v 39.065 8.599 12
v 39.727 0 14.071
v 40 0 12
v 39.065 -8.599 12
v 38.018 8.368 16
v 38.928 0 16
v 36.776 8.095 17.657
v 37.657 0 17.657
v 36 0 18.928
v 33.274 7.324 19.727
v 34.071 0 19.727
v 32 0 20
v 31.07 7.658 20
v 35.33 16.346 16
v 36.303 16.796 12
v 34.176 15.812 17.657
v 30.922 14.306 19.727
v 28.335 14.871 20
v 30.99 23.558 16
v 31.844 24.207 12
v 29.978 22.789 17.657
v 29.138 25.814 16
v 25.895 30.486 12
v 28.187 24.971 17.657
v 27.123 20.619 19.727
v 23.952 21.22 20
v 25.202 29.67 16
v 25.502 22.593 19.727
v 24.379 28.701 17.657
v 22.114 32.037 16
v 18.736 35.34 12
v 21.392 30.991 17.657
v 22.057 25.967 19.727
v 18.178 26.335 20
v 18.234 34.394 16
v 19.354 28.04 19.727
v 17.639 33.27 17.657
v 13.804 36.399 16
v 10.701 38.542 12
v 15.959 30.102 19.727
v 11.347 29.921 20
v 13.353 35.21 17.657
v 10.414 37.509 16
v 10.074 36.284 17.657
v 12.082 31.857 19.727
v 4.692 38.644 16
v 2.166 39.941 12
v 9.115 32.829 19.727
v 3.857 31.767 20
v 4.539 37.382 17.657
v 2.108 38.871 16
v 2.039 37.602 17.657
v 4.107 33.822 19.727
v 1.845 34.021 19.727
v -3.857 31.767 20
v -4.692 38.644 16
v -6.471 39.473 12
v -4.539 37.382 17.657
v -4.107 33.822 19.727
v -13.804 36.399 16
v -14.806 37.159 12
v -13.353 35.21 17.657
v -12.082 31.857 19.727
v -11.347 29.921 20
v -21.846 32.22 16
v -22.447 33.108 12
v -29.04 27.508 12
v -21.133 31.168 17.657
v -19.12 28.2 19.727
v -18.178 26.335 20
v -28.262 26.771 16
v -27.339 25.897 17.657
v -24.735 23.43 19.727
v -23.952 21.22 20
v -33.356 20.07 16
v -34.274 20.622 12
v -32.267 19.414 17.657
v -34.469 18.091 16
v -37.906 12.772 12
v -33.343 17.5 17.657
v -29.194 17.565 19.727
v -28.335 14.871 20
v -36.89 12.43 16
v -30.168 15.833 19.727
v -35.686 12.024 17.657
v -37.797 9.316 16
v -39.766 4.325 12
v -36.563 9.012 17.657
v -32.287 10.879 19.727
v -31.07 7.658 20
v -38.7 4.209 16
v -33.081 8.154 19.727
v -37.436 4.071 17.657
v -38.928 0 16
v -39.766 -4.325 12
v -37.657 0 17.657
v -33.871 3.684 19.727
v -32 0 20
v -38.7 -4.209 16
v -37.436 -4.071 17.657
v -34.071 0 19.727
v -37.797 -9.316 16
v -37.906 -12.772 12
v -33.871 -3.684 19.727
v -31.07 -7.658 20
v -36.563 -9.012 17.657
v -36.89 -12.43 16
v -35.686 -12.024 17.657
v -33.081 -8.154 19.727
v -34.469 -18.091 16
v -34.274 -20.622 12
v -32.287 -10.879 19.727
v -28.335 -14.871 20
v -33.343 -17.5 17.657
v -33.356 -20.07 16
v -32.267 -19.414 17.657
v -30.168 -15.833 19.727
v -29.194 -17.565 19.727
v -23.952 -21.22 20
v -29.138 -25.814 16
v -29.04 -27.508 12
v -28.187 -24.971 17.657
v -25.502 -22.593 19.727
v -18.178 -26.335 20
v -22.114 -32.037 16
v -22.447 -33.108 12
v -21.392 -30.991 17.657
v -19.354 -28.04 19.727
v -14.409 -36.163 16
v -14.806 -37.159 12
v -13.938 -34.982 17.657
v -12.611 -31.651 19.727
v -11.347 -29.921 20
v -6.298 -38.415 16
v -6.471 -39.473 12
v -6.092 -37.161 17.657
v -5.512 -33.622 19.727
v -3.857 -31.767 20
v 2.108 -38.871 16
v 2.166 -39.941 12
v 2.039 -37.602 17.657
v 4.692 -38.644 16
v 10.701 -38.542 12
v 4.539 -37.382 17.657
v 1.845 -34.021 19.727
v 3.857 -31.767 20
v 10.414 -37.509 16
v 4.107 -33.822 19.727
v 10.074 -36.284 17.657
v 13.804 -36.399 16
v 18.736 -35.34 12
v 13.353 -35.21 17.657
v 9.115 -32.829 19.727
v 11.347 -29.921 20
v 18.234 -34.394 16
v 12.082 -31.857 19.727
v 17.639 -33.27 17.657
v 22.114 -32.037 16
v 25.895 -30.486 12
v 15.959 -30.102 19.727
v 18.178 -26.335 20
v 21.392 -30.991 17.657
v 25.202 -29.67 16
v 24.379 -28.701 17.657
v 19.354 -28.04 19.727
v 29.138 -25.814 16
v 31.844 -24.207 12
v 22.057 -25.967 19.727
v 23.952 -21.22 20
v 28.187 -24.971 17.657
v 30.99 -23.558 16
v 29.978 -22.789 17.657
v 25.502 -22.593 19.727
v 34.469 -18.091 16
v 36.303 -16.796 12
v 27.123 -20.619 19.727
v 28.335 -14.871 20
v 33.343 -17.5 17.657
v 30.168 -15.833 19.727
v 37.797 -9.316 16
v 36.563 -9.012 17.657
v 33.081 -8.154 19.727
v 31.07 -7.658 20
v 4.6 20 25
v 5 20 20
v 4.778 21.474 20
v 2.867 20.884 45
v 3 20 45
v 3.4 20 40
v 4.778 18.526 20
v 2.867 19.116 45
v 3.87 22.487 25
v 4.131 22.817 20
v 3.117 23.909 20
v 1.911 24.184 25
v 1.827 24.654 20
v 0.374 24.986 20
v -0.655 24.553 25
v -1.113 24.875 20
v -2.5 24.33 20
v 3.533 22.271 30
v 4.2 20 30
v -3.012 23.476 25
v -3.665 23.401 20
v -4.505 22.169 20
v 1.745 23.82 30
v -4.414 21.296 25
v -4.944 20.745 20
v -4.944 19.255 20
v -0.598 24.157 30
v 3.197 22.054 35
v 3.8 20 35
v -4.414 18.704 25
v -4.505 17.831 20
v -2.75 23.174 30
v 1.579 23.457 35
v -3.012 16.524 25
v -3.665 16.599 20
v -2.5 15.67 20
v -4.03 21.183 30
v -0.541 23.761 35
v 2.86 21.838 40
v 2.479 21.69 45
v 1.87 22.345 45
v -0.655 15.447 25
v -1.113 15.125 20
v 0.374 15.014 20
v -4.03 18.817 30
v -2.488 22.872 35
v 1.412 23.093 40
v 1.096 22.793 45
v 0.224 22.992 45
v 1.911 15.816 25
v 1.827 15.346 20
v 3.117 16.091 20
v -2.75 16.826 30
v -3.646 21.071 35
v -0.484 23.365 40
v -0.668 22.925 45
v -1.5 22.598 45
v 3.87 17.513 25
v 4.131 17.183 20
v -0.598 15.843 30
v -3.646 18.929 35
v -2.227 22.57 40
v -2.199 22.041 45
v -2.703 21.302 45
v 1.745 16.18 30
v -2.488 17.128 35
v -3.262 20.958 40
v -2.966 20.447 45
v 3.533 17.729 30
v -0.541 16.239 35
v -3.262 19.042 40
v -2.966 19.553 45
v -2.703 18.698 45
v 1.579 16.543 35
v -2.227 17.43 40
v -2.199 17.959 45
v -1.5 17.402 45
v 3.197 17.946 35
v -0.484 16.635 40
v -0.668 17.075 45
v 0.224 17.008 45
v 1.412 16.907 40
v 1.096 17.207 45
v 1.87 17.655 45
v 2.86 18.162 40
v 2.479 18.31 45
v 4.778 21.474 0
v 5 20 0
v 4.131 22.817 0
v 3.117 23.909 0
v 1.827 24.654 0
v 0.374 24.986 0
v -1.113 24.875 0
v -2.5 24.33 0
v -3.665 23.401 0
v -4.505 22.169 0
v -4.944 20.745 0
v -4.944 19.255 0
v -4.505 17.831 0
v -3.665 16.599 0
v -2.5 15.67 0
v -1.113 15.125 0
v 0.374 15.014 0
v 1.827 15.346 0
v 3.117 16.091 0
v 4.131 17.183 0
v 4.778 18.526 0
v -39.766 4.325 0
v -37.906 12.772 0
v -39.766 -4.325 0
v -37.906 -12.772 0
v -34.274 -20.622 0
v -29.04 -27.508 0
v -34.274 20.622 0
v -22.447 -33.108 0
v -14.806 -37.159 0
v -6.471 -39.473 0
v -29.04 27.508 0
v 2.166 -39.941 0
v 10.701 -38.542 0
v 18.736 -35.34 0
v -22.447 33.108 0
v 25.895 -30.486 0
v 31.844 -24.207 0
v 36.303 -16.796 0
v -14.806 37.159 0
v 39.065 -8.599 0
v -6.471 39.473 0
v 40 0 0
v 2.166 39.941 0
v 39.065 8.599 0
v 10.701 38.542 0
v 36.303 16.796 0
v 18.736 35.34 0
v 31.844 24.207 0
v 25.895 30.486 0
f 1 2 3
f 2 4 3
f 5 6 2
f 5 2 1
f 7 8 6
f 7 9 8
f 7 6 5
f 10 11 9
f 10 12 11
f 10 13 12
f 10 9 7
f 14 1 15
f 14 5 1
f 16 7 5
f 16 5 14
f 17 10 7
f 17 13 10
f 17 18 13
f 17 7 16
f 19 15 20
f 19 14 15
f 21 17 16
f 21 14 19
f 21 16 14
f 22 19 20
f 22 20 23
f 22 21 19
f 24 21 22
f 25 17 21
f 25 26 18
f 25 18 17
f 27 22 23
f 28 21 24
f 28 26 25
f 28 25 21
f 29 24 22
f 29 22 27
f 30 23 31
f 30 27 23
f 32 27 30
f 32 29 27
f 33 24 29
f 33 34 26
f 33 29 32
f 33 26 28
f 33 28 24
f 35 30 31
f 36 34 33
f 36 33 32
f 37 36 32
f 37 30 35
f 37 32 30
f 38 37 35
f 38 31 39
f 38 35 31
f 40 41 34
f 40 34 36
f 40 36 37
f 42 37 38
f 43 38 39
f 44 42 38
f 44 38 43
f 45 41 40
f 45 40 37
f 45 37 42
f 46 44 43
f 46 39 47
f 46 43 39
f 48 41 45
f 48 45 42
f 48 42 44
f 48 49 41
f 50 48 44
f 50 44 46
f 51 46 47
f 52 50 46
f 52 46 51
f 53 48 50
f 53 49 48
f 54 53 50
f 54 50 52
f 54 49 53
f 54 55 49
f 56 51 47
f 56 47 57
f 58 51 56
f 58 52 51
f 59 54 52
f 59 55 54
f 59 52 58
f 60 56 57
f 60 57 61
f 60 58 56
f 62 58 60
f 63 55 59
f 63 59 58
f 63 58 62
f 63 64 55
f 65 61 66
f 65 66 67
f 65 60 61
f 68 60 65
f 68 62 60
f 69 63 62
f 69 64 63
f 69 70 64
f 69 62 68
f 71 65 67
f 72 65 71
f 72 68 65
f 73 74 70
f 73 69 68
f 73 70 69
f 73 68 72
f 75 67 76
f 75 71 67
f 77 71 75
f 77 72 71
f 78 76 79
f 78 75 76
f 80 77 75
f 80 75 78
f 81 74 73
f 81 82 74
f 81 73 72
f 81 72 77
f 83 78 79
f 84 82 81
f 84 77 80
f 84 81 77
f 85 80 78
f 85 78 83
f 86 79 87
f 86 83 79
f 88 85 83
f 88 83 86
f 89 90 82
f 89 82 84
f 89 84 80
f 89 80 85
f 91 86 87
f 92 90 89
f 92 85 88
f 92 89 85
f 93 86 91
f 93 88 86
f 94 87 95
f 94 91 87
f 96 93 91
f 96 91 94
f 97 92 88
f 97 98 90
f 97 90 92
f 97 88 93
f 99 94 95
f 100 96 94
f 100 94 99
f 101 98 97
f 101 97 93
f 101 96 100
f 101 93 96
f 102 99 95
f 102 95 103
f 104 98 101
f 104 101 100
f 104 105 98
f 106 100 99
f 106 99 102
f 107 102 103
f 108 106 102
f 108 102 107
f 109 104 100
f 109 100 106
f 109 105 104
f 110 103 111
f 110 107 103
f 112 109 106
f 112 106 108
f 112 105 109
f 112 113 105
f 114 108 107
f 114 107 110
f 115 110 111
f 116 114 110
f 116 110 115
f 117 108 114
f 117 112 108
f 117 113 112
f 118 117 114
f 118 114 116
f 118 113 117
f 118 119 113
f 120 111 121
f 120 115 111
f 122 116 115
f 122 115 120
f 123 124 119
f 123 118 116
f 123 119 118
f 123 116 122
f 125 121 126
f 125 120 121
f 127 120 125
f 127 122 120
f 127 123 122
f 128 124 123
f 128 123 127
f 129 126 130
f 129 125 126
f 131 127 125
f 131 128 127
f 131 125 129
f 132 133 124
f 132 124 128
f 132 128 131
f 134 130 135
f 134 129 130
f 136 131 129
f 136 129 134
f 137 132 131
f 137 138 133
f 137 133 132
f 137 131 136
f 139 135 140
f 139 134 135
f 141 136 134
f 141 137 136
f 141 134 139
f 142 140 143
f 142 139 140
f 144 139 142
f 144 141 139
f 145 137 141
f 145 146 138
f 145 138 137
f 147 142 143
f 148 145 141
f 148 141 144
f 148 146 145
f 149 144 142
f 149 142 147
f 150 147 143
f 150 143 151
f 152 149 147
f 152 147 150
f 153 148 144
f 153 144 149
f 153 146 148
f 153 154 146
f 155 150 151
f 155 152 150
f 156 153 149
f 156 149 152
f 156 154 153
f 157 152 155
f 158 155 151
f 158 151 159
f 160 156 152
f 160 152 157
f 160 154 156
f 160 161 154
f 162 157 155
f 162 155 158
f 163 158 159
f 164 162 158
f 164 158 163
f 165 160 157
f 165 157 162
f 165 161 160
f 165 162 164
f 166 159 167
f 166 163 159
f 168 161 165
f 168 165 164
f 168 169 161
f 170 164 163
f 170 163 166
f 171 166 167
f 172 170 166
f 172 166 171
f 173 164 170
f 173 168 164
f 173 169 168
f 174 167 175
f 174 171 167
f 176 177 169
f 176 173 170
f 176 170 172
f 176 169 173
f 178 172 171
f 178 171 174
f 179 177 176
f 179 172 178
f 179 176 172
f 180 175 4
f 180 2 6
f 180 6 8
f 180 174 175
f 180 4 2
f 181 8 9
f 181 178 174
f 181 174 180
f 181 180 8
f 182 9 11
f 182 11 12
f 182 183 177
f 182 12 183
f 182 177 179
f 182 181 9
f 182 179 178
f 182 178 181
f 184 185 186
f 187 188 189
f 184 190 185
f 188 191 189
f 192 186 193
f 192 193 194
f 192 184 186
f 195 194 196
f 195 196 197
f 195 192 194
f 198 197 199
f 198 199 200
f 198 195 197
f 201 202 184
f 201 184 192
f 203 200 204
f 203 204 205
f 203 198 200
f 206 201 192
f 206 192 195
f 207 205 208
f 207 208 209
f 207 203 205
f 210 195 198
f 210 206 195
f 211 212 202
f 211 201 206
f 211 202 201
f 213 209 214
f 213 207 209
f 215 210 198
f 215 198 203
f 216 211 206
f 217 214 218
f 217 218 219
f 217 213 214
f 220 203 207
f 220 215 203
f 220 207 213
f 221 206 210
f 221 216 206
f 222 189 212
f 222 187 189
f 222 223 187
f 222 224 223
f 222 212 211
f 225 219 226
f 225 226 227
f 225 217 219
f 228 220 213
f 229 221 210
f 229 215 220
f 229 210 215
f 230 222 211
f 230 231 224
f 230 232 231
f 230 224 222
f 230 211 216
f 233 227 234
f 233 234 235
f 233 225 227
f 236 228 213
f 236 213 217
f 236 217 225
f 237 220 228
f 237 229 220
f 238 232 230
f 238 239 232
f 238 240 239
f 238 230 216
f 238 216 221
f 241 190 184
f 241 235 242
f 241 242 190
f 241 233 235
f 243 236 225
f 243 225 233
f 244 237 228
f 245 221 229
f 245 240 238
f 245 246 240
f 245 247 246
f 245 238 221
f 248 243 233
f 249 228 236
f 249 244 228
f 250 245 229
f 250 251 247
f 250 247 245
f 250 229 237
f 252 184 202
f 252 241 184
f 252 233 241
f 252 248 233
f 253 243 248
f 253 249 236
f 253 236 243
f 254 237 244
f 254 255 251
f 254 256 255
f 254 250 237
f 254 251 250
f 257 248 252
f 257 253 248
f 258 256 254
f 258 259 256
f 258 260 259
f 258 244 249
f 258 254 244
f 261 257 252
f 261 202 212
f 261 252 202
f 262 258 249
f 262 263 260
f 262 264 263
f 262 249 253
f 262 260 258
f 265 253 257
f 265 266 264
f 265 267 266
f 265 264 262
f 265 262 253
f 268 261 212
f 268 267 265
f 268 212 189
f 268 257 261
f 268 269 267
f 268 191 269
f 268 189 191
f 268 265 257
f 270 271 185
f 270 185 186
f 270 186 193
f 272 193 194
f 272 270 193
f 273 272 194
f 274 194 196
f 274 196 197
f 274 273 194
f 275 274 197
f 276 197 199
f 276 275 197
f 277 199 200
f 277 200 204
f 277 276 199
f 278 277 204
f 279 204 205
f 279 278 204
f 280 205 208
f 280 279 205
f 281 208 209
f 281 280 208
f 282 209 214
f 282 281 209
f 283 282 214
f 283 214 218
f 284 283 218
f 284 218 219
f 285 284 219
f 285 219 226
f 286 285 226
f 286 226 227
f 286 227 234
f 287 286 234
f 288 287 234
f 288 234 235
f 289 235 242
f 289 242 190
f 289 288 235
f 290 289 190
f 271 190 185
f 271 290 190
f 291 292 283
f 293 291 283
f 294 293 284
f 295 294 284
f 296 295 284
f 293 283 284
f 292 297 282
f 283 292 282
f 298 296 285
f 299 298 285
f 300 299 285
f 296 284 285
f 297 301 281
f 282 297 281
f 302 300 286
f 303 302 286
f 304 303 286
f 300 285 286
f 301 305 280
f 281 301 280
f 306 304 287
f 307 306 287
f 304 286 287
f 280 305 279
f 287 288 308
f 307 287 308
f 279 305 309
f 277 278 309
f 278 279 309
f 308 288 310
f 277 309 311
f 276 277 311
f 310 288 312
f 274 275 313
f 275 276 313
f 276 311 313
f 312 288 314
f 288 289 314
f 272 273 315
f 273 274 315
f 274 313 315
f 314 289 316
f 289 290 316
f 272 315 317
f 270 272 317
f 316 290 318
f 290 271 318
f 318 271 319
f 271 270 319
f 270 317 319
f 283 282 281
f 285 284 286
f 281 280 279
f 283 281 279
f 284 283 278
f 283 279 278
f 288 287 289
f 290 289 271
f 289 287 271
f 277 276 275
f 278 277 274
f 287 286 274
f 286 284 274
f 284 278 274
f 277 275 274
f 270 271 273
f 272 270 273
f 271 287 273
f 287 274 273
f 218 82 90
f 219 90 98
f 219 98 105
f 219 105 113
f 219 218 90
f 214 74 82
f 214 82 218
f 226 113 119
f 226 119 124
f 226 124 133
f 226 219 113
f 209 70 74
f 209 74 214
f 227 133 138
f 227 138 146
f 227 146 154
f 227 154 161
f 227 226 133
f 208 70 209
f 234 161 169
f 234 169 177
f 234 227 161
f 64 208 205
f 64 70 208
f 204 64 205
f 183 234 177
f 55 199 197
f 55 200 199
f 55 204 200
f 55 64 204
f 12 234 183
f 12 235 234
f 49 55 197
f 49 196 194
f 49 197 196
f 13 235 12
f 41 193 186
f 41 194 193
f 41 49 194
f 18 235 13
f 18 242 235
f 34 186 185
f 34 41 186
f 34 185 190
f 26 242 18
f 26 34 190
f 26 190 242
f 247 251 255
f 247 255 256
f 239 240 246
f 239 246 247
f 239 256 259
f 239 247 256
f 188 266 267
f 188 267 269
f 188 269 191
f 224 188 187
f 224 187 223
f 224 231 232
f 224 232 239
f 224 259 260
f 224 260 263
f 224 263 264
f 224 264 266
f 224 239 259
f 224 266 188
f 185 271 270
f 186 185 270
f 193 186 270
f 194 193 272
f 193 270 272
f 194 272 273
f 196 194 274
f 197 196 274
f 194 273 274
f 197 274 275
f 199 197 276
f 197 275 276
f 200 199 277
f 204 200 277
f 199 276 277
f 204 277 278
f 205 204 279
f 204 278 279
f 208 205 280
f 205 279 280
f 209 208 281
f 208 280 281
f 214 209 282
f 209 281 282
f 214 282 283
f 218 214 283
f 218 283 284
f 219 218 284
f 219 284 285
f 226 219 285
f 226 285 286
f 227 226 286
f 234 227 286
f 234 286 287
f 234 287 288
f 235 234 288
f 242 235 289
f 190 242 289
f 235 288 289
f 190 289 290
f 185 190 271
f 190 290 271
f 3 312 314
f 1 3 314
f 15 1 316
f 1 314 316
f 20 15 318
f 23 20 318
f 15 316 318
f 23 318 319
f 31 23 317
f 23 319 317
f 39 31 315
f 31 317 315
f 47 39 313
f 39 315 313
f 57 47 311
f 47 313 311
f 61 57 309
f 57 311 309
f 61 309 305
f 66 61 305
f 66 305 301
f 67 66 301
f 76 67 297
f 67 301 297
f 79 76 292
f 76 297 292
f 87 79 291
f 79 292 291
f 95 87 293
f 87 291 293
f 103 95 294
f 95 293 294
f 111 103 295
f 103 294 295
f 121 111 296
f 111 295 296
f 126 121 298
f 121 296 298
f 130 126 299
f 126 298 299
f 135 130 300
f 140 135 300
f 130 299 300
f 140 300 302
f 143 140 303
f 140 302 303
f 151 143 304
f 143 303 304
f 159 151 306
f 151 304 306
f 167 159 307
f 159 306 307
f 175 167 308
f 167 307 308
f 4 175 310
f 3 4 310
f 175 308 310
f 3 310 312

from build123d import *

# Parameters (mm, degrees)
F0_R     = 40
F0_R_2   = 5
F1_DEPTH = 20
F2_R     = 8
F3_DEPTH = 45
F4_SIZE2 = 2
F4_SIZE  = 25


with BuildPart() as f1:
    # F0 (on Top) → F1 (new body)
    with BuildSketch(Plane.XY):
        Circle(F0_R)
        with Locations((0, 20)):
            Circle(F0_R_2, mode=Mode.SUBTRACT)
    extrude(amount=F1_DEPTH)

    # F2
    f2_edges = [f1.edges().sort_by_distance(p)[0] for p in [
        (-40, 0, 20),
    ]]
    fillet(f2_edges, radius=F2_R)


with BuildPart() as f3:
    # F0 (on Top) → F3 (new body)
    with BuildSketch(Plane.XY):
        with Locations((0, 20)):
            Circle(F0_R_2)
    extrude(amount=F3_DEPTH)

    # F4
    f4_edges = [f3.edges().sort_by_distance(p)[0] for p in [
        (-5, 20, 45),
    ]]
    f4_side = f3.faces().sort_by_distance((-5, 20, 22.5))[0]
    chamfer(f4_edges, length=F4_SIZE, length2=F4_SIZE2, reference=f4_side)


solid = Compound([f1.part, f3.part])
